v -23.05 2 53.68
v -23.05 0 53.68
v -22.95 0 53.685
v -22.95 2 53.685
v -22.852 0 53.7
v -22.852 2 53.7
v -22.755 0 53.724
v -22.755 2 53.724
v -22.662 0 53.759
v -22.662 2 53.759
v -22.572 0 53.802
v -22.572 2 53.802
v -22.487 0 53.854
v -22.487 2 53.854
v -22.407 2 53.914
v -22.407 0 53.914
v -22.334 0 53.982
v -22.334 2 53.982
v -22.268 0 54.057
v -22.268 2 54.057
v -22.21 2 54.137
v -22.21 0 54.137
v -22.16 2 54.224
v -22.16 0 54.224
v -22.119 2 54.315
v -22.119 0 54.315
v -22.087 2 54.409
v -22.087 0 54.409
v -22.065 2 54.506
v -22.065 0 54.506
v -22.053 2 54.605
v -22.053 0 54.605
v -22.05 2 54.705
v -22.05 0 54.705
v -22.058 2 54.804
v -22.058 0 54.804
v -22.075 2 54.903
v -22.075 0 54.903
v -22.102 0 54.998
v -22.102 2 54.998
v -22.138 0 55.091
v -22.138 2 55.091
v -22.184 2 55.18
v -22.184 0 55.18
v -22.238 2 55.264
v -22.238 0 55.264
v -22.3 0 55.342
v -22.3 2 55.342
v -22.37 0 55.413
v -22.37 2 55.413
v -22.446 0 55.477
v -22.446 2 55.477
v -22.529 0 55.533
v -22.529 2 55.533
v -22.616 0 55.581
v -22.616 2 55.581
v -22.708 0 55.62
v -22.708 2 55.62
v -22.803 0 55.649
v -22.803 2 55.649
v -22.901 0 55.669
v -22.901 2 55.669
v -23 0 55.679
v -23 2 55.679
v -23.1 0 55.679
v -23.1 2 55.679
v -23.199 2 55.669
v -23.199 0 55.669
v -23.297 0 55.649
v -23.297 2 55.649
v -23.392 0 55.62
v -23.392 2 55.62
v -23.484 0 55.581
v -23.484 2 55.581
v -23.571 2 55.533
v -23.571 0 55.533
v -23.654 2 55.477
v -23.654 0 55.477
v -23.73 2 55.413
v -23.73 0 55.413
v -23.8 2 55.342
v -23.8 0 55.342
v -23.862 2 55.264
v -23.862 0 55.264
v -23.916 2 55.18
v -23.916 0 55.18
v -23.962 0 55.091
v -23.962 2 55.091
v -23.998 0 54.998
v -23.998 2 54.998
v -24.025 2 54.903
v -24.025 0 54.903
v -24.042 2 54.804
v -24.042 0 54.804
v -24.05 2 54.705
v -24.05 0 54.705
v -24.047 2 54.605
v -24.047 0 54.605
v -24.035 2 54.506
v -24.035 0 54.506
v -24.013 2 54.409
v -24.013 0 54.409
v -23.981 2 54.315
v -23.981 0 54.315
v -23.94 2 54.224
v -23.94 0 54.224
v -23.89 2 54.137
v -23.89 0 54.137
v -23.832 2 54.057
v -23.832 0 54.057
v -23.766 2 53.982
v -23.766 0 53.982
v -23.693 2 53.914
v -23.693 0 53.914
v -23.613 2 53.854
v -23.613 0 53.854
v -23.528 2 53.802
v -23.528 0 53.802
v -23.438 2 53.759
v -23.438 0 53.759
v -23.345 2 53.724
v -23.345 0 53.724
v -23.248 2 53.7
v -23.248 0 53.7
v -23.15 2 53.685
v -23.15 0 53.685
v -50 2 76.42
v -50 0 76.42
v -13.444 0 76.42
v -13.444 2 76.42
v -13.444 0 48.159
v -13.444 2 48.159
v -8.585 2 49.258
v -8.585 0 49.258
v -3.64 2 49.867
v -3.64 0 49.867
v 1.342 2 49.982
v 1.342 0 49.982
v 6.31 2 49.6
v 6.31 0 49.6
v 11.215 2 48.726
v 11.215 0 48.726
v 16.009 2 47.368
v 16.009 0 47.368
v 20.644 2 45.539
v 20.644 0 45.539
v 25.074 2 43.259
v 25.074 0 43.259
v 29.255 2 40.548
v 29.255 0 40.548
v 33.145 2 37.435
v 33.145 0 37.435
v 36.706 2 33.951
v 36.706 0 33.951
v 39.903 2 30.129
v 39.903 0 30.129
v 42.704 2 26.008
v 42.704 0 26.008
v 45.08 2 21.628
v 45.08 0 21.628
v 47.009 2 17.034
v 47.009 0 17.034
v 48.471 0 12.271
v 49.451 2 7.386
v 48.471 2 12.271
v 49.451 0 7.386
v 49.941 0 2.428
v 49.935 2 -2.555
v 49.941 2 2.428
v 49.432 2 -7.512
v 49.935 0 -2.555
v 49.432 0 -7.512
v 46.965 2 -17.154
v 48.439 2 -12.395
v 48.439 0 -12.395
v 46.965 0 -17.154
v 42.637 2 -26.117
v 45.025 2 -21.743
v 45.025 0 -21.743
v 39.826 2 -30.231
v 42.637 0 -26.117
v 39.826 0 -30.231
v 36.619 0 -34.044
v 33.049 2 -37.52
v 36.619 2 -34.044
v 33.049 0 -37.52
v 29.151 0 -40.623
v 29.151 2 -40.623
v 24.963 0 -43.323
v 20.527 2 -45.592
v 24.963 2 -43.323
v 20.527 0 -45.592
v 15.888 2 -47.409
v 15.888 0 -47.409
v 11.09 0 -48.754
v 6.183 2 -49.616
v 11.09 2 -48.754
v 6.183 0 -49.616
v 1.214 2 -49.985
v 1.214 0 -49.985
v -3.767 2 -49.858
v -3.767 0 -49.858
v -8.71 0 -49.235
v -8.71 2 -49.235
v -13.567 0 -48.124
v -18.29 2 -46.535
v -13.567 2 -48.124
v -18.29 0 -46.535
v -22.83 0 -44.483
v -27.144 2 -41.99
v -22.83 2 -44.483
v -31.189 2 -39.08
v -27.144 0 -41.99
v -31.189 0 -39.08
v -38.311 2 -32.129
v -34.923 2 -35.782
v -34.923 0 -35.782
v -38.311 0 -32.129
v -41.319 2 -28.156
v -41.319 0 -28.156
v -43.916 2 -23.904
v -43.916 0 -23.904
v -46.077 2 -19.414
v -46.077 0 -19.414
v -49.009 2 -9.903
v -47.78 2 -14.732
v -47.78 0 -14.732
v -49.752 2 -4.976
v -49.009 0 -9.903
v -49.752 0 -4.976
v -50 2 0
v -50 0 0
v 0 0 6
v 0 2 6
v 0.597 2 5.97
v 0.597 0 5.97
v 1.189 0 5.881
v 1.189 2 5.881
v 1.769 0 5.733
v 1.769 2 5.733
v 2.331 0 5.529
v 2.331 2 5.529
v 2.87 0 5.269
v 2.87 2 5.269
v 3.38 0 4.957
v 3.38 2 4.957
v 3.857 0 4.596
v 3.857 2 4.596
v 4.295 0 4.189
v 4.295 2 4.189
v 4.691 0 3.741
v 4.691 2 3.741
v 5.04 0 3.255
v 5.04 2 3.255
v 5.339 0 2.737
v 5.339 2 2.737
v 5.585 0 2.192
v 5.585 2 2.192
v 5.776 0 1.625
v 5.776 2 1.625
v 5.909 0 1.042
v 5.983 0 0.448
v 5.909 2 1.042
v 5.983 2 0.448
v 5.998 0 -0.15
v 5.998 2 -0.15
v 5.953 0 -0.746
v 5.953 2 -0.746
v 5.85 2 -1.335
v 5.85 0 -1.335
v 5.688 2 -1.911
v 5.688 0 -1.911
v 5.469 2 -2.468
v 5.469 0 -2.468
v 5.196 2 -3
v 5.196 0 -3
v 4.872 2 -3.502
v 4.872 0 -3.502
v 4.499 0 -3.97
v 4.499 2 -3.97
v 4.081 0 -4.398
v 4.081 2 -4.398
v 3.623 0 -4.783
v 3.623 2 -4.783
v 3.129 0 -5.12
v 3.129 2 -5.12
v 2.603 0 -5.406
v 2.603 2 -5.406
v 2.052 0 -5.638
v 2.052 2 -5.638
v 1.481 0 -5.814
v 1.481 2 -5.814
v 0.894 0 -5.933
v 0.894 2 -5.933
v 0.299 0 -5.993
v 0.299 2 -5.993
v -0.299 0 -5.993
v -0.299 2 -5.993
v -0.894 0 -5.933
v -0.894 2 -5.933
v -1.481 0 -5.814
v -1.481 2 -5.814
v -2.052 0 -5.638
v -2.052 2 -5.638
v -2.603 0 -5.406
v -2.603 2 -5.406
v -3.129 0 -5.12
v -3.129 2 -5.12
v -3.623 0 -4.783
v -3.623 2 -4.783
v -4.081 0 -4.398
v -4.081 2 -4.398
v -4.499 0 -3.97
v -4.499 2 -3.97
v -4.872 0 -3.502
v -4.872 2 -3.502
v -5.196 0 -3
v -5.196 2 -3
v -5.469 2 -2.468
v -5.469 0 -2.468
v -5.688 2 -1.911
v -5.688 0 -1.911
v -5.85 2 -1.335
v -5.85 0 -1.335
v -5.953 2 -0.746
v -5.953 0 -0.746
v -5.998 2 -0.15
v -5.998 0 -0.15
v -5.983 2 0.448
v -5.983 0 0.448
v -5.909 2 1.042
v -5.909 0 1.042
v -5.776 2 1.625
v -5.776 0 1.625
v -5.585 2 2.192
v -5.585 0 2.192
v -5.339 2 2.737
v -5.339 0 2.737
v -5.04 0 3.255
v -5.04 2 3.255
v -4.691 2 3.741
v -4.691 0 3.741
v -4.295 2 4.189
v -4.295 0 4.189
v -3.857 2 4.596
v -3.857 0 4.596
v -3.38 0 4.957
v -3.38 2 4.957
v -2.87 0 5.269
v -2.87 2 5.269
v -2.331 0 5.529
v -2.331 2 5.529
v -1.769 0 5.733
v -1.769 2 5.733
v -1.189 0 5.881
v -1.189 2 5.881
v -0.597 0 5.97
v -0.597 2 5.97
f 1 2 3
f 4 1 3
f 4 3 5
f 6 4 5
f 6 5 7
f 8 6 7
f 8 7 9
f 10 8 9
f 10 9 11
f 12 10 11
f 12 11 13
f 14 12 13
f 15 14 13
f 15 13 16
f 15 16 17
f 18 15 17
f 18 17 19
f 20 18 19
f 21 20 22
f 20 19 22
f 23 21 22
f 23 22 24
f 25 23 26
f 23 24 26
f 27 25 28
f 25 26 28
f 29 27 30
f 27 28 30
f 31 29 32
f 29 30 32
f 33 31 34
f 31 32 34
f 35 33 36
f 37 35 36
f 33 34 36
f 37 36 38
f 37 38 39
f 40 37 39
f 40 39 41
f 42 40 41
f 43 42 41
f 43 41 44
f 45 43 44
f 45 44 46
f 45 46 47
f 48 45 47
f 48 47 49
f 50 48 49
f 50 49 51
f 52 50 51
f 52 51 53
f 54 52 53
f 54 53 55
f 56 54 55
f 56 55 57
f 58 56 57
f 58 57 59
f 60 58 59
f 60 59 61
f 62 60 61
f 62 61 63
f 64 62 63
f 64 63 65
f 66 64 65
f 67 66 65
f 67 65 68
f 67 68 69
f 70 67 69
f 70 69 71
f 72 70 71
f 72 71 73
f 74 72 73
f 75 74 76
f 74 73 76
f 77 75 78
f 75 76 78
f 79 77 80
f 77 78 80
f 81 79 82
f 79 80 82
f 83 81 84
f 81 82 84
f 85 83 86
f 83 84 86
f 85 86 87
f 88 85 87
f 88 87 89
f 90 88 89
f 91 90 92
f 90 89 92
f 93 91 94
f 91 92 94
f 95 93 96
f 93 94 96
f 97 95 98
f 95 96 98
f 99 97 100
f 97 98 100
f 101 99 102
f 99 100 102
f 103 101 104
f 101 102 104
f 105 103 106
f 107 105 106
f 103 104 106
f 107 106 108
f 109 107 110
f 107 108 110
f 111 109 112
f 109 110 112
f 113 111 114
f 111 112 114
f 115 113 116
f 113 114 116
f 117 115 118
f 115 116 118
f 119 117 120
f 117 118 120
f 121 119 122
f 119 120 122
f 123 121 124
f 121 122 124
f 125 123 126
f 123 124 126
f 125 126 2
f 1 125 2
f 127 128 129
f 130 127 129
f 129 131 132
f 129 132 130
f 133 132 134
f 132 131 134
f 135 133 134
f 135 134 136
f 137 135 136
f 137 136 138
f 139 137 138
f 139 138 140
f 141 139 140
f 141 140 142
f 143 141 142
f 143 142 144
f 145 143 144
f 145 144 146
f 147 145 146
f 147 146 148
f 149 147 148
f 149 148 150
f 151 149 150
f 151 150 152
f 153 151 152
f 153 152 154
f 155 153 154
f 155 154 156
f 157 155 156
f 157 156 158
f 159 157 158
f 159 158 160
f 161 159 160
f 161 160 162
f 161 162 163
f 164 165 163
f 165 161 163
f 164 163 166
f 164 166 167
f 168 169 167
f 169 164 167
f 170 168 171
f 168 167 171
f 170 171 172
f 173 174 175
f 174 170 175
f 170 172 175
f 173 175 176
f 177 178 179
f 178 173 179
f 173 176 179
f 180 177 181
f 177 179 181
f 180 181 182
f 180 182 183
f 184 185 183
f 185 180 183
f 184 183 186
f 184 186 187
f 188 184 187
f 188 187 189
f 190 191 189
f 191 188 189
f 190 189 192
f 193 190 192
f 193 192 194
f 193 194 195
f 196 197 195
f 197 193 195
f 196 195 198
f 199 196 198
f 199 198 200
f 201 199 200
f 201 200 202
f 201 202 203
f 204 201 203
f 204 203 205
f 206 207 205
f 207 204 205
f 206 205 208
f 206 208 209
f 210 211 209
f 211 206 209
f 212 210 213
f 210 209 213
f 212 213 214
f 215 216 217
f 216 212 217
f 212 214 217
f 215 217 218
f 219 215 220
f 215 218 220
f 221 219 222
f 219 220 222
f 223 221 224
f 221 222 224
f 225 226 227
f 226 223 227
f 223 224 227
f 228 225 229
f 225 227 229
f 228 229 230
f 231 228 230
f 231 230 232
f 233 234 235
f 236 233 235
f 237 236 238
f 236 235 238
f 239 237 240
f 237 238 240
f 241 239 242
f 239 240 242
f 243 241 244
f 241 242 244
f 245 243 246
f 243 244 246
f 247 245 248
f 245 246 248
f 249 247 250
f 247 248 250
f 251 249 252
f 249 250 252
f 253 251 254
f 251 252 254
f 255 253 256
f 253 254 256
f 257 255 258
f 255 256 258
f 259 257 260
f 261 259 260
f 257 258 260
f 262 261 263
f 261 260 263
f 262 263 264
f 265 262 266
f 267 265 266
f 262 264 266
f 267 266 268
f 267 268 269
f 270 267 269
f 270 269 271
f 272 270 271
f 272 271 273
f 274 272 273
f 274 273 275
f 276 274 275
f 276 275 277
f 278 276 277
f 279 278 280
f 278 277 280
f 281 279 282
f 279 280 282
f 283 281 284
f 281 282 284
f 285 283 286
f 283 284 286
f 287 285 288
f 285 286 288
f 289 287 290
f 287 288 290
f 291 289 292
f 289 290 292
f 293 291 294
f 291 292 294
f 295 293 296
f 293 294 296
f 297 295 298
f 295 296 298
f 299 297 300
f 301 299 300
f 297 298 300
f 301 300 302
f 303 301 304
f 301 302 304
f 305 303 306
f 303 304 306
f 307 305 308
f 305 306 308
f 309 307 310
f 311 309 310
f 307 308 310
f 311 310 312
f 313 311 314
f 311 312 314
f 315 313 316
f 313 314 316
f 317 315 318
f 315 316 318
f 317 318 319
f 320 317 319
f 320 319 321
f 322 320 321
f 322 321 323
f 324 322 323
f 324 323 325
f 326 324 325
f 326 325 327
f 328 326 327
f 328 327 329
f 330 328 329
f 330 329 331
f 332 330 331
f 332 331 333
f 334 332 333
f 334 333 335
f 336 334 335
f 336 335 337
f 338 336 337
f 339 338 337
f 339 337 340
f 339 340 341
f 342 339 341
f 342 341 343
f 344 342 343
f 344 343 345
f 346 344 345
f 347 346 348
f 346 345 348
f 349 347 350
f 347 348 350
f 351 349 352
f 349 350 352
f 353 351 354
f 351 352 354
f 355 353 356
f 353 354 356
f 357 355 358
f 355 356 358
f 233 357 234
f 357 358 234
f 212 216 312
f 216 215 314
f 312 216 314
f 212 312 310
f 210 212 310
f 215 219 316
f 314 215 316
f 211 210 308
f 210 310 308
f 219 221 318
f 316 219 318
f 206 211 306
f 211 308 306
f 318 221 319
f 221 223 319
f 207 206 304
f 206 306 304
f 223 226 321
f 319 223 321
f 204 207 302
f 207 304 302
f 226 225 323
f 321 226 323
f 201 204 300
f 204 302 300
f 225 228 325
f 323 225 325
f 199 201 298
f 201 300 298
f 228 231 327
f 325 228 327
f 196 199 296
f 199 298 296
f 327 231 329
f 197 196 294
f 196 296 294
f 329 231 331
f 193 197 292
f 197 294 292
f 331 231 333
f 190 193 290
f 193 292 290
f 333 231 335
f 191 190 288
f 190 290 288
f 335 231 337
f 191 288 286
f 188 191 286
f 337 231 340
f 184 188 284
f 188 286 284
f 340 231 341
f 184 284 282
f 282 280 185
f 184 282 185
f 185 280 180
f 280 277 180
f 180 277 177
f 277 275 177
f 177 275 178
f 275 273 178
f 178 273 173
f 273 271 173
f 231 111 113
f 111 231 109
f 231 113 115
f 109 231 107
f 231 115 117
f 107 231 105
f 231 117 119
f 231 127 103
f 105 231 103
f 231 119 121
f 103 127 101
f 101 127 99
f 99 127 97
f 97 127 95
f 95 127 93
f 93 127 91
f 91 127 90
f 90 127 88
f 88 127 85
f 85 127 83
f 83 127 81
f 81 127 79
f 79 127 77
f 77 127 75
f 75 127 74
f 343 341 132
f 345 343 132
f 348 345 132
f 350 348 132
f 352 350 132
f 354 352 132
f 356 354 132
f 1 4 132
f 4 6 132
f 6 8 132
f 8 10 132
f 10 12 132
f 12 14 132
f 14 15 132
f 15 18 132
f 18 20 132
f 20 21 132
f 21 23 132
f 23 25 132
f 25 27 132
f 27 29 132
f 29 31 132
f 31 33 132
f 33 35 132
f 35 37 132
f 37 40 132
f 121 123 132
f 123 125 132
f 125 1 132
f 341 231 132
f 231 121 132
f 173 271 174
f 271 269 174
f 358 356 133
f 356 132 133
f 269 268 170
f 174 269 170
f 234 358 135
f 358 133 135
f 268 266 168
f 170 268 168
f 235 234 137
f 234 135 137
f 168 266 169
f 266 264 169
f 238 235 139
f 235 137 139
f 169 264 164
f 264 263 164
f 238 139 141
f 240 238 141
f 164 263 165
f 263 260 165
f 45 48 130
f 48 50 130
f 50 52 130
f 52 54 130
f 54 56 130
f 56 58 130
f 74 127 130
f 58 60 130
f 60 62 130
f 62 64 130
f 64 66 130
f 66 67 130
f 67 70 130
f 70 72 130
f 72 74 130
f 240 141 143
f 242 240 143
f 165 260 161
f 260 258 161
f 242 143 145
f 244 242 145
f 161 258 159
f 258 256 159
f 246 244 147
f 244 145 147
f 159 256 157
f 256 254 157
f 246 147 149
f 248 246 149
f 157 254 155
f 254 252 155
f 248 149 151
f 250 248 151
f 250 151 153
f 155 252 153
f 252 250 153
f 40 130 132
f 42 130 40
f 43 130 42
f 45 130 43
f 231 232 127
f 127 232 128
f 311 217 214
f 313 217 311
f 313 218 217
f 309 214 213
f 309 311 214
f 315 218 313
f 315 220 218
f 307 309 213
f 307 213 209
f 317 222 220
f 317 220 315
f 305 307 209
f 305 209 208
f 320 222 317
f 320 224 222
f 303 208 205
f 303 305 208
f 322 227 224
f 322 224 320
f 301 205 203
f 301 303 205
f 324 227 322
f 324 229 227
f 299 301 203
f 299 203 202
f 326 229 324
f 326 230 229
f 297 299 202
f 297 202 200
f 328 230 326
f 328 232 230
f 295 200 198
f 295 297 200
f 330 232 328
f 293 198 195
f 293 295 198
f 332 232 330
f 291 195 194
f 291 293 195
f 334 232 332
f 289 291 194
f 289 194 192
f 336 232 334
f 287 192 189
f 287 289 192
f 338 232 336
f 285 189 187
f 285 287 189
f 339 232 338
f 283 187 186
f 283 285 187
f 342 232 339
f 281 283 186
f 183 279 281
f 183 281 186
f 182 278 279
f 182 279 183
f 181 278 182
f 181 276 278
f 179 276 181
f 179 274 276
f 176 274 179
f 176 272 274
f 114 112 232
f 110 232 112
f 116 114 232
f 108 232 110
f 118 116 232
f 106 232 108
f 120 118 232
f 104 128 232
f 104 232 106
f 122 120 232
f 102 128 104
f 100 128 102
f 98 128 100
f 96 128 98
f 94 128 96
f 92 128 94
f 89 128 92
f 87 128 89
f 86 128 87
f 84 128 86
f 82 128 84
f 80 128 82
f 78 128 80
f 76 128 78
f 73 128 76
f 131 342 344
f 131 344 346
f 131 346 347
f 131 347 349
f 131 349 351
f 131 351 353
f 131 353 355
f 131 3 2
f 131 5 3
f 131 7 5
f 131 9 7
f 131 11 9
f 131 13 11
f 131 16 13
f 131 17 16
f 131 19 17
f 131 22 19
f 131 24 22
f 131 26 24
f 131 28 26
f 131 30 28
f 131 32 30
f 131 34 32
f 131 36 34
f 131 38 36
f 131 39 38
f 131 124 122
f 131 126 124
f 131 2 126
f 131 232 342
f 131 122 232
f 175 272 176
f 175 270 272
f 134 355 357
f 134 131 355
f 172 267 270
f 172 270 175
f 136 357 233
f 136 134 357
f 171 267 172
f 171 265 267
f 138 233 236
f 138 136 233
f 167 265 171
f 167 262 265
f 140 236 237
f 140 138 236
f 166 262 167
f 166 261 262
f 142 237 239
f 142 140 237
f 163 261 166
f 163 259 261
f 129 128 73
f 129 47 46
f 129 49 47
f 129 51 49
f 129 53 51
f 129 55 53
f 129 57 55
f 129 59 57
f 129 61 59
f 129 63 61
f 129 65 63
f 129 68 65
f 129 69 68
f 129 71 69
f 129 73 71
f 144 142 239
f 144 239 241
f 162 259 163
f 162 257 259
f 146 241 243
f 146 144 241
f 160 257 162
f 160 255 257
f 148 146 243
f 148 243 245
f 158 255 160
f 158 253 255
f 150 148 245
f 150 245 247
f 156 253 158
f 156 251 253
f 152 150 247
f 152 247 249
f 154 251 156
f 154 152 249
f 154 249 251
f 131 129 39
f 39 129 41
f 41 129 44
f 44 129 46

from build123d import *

# Parameters (mm, degrees)
SKETCH1_R           = 50
BOSS_EXTRUDE1_DEPTH = 2
SKETCH2_R           = 6
CUT_EXTRUDE1_DEPTH  = 2
SKETCH3_W           = 36.555538841
SKETCH3_H           = 76.419948839
BOSS_EXTRUDE2_DEPTH = 2
CUT_EXTRUDE2_REACH  = 93.346
SKETCH8_R           = 1


with BuildPart() as part:
    # Sketch1 → Boss-Extrude1 (new body)
    with BuildSketch(Plane(origin=(0, 0, 0), x_dir=(1, 0, 0), z_dir=(0, 1, 0))):
        with Locations(Location((0, 0, 0), (0, 0, 270))):
            Circle(SKETCH1_R)
    extrude(amount=BOSS_EXTRUDE1_DEPTH)

    # Sketch2 → Cut-Extrude1 (cut)
    with BuildSketch(Plane(origin=(0, 2, 0), x_dir=(1, 0, 0), z_dir=(0, 1, 0))):
        with Locations(Location((0, 0, 0), (0, 0, 270))):
            Circle(SKETCH2_R)
    extrude(amount=-CUT_EXTRUDE1_DEPTH, mode=Mode.SUBTRACT)

    # Sketch3 → Boss-Extrude2 (add, through all)
    with BuildSketch(Plane.XZ):
        with Locations((-31.722230579, 38.209974419)):
            Rectangle(SKETCH3_W, SKETCH3_H)
    extrude(amount=-BOSS_EXTRUDE2_DEPTH)

    # Sketch8 → Cut-Extrude2 (cut, up to next)
    with BuildSketch(Plane.XZ, mode=Mode.PRIVATE) as cut_extrude2_sk1:
        with Locations(Location((-23.05, 54.68, 0), (0, 0, 270))):
            Circle(SKETCH8_R)
    cut_extrude2_tool1 = extrude(cut_extrude2_sk1.sketch, amount=-CUT_EXTRUDE2_REACH, mode=Mode.PRIVATE) & part.part
    add(cut_extrude2_tool1.solids().sort_by_distance((-23.05, 0, 54.68))[0], mode=Mode.SUBTRACT)


solid = part.part
